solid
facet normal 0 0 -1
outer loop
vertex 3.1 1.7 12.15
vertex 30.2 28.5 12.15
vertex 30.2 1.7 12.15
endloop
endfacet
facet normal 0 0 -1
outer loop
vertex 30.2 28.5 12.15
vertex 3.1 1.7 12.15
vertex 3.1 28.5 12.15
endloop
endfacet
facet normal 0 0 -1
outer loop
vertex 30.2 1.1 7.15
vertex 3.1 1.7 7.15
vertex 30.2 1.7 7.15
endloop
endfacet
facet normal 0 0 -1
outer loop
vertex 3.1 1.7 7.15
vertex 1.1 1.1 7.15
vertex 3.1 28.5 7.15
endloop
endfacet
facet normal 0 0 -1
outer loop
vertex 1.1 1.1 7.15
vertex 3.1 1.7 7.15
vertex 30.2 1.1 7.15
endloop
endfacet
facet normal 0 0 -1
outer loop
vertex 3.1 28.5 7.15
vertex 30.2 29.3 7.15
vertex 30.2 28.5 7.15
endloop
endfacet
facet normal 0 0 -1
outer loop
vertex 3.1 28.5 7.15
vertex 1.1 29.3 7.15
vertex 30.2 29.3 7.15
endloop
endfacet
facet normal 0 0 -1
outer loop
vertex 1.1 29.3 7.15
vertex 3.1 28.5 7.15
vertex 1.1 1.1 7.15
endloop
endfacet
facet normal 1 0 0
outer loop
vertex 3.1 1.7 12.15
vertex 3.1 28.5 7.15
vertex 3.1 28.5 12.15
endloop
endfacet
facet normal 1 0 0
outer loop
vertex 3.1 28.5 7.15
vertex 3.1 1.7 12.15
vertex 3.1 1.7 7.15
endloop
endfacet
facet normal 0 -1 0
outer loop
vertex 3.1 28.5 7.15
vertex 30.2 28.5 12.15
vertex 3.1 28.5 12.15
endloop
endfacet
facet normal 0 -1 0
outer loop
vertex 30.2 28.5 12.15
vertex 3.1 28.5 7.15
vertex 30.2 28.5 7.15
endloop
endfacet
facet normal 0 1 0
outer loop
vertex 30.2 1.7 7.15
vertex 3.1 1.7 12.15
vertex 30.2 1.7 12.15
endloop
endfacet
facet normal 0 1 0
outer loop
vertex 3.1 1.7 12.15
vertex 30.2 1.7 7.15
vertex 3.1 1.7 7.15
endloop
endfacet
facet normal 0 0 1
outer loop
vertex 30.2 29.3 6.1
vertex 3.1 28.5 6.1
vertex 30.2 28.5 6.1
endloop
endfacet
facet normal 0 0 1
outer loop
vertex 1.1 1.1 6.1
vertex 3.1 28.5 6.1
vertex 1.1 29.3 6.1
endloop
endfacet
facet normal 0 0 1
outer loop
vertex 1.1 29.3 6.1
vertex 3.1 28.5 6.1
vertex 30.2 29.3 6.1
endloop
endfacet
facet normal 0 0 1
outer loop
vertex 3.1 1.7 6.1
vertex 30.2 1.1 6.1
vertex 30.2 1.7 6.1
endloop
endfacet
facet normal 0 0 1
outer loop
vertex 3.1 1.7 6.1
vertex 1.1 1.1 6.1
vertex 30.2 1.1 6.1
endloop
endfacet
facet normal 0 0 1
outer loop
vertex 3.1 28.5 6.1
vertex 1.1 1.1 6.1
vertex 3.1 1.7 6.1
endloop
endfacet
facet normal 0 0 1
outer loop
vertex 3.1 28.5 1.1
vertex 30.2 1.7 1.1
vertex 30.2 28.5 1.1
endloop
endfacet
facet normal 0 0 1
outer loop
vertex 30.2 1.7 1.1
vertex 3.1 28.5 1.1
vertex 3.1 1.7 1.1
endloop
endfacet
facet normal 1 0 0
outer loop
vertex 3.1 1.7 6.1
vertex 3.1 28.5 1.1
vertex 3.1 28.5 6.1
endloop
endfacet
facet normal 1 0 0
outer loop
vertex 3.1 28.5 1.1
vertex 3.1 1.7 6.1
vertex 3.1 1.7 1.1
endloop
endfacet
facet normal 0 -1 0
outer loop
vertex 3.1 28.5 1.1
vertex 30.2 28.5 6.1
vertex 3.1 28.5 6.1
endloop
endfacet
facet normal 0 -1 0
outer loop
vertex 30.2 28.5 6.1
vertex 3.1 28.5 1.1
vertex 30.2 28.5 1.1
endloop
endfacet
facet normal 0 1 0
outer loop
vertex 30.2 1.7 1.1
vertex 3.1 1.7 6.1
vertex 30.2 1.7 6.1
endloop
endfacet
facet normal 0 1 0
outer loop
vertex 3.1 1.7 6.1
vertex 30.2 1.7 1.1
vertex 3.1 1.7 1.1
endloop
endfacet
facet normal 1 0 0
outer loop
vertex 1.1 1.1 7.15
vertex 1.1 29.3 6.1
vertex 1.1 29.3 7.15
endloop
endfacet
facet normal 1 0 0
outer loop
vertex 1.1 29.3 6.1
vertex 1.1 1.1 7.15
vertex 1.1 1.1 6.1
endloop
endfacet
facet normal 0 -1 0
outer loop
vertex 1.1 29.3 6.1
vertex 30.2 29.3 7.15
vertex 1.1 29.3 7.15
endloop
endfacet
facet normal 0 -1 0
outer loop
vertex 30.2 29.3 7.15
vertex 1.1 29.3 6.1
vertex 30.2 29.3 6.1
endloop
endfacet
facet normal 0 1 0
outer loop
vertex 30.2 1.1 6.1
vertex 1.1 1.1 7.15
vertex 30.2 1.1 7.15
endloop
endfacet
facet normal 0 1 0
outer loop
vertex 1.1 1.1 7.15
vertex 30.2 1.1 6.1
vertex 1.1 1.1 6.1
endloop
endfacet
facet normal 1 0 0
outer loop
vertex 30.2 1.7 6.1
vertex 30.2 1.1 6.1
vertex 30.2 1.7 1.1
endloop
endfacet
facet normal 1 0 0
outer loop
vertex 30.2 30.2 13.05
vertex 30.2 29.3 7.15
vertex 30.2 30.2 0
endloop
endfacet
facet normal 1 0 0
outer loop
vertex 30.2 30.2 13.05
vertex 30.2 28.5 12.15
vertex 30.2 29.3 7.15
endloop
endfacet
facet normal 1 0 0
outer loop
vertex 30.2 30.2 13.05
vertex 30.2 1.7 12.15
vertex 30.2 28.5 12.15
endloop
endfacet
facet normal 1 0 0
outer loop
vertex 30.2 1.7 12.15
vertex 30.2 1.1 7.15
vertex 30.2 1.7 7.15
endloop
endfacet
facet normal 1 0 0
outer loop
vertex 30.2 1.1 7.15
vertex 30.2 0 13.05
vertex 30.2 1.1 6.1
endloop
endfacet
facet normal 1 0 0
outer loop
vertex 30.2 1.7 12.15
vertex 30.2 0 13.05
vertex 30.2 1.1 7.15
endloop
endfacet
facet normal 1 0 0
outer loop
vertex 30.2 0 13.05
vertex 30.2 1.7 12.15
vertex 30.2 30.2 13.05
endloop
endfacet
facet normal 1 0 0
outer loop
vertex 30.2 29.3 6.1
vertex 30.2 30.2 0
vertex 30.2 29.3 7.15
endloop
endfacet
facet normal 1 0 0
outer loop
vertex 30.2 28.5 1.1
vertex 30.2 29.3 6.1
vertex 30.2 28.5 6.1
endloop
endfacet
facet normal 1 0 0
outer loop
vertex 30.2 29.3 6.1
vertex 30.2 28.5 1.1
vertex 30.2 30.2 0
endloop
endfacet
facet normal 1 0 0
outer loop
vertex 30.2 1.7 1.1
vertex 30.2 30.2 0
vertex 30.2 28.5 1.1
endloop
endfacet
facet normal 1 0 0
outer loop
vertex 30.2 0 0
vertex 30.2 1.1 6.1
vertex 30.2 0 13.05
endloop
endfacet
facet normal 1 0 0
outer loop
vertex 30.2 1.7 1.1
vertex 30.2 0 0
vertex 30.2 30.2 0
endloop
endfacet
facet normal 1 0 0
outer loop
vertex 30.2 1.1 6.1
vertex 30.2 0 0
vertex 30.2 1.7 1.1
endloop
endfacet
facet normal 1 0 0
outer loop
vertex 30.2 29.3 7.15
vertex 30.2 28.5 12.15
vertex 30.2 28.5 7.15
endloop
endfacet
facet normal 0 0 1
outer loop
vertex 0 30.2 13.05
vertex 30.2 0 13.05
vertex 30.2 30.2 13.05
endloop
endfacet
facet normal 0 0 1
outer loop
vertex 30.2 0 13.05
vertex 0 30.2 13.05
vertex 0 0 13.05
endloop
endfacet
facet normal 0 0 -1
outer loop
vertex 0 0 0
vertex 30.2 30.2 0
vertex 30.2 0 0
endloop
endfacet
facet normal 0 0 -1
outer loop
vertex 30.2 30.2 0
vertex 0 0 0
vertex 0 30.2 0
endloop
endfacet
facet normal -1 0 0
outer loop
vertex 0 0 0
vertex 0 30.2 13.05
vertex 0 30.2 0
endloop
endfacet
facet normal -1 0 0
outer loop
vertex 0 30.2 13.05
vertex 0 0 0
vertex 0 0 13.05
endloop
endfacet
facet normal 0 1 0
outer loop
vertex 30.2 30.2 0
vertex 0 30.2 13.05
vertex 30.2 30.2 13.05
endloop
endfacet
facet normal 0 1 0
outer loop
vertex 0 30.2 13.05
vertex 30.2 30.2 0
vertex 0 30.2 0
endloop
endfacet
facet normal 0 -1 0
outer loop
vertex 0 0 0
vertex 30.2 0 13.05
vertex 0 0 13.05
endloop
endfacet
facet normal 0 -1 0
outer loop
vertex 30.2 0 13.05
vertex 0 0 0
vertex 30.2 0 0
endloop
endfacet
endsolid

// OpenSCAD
$fn = 60;

e_m = 0.1;      //3D-printing error margin

//circuit board
cb_w = 28;    //circuit board width
cb_d = 28;    //circuit board depth
cb_h = 0.85;     //circuit board height

//circuit board placement
//cb_p_h = 4;   //height
cb_p_s_d = 0.7;   //sloth depth
cb_b_s = 1;     // back slot yes(1) or no(0)
//circuit board height needs to be changed by the circuit board height

//component opening
cb_p_h_t = 5;   //height top
cb_p_h_b = 5;   //height bottom

//casing
c_t = 1;        //Case thick
c_w = c_t*2+e_m*2+cb_w;       //case width
c_d = c_t*2+e_m*2+cb_d;       //case depth
c_h = c_t*2+e_m*2+cb_h+cb_p_h_b+cb_p_h_t;       //case height
echo(c_w); //68.7
echo(c_d); //48.6
echo(c_h); //22.8
//Case height needs to be changed by the circuit board height

circuit_holder();

module circuit_holder(){
    difference(){
        cube([c_w, c_d, c_h]);
        pcb_no_go_zone();
    }
}

module pcb_no_go_zone(){
    union(){
        union(){
            if ( cb_b_s == 1){
                translate([(c_w-cb_w)+c_t-e_m*2+e_m,c_t+cb_p_s_d,(cb_p_h_b+e_m + c_t)+cb_h+e_m*2])
                cube([(cb_w+e_m*2)-cb_p_s_d + c_t, (cb_d+e_m*2)-cb_p_s_d*2, cb_p_h_t]);
                translate([(c_w-cb_w)+c_t-e_m*2+e_m,c_t+cb_p_s_d,(cb_p_h_b+e_m + c_t) - cb_p_h_b])
                cube([(cb_w+e_m*2)-cb_p_s_d+ c_t, (cb_d+e_m*2)-cb_p_s_d*2, cb_p_h_b]);
            }
            else{
                translate([(c_w-cb_w)-c_t-e_m*2+e_m,c_t+cb_p_s_d,(cb_p_h_b+e_m+c_t)+cb_h+e_m*2])
                cube([(cb_w+e_m*2)+ c_t, (cb_d+e_m*2)-cb_p_s_d*2, cb_p_h_t]);
                translate([(c_w-cb_w)-c_t-e_m*2+e_m,c_t+cb_p_s_d,(cb_p_h_b+e_m+c_t) - cb_p_h_b])
                cube([(cb_w+e_m*2)+ c_t, (cb_d+e_m*2)-cb_p_s_d*2, cb_p_h_b]);
            }
        }
        translate([(c_w-cb_w)-c_t-e_m*2+e_m,c_t+e_m,cb_p_h_b+e_m+c_t])
        cube([cb_w+e_m*2+ c_t, cb_d+e_m*2, cb_h+e_m*2]);
    }
}
